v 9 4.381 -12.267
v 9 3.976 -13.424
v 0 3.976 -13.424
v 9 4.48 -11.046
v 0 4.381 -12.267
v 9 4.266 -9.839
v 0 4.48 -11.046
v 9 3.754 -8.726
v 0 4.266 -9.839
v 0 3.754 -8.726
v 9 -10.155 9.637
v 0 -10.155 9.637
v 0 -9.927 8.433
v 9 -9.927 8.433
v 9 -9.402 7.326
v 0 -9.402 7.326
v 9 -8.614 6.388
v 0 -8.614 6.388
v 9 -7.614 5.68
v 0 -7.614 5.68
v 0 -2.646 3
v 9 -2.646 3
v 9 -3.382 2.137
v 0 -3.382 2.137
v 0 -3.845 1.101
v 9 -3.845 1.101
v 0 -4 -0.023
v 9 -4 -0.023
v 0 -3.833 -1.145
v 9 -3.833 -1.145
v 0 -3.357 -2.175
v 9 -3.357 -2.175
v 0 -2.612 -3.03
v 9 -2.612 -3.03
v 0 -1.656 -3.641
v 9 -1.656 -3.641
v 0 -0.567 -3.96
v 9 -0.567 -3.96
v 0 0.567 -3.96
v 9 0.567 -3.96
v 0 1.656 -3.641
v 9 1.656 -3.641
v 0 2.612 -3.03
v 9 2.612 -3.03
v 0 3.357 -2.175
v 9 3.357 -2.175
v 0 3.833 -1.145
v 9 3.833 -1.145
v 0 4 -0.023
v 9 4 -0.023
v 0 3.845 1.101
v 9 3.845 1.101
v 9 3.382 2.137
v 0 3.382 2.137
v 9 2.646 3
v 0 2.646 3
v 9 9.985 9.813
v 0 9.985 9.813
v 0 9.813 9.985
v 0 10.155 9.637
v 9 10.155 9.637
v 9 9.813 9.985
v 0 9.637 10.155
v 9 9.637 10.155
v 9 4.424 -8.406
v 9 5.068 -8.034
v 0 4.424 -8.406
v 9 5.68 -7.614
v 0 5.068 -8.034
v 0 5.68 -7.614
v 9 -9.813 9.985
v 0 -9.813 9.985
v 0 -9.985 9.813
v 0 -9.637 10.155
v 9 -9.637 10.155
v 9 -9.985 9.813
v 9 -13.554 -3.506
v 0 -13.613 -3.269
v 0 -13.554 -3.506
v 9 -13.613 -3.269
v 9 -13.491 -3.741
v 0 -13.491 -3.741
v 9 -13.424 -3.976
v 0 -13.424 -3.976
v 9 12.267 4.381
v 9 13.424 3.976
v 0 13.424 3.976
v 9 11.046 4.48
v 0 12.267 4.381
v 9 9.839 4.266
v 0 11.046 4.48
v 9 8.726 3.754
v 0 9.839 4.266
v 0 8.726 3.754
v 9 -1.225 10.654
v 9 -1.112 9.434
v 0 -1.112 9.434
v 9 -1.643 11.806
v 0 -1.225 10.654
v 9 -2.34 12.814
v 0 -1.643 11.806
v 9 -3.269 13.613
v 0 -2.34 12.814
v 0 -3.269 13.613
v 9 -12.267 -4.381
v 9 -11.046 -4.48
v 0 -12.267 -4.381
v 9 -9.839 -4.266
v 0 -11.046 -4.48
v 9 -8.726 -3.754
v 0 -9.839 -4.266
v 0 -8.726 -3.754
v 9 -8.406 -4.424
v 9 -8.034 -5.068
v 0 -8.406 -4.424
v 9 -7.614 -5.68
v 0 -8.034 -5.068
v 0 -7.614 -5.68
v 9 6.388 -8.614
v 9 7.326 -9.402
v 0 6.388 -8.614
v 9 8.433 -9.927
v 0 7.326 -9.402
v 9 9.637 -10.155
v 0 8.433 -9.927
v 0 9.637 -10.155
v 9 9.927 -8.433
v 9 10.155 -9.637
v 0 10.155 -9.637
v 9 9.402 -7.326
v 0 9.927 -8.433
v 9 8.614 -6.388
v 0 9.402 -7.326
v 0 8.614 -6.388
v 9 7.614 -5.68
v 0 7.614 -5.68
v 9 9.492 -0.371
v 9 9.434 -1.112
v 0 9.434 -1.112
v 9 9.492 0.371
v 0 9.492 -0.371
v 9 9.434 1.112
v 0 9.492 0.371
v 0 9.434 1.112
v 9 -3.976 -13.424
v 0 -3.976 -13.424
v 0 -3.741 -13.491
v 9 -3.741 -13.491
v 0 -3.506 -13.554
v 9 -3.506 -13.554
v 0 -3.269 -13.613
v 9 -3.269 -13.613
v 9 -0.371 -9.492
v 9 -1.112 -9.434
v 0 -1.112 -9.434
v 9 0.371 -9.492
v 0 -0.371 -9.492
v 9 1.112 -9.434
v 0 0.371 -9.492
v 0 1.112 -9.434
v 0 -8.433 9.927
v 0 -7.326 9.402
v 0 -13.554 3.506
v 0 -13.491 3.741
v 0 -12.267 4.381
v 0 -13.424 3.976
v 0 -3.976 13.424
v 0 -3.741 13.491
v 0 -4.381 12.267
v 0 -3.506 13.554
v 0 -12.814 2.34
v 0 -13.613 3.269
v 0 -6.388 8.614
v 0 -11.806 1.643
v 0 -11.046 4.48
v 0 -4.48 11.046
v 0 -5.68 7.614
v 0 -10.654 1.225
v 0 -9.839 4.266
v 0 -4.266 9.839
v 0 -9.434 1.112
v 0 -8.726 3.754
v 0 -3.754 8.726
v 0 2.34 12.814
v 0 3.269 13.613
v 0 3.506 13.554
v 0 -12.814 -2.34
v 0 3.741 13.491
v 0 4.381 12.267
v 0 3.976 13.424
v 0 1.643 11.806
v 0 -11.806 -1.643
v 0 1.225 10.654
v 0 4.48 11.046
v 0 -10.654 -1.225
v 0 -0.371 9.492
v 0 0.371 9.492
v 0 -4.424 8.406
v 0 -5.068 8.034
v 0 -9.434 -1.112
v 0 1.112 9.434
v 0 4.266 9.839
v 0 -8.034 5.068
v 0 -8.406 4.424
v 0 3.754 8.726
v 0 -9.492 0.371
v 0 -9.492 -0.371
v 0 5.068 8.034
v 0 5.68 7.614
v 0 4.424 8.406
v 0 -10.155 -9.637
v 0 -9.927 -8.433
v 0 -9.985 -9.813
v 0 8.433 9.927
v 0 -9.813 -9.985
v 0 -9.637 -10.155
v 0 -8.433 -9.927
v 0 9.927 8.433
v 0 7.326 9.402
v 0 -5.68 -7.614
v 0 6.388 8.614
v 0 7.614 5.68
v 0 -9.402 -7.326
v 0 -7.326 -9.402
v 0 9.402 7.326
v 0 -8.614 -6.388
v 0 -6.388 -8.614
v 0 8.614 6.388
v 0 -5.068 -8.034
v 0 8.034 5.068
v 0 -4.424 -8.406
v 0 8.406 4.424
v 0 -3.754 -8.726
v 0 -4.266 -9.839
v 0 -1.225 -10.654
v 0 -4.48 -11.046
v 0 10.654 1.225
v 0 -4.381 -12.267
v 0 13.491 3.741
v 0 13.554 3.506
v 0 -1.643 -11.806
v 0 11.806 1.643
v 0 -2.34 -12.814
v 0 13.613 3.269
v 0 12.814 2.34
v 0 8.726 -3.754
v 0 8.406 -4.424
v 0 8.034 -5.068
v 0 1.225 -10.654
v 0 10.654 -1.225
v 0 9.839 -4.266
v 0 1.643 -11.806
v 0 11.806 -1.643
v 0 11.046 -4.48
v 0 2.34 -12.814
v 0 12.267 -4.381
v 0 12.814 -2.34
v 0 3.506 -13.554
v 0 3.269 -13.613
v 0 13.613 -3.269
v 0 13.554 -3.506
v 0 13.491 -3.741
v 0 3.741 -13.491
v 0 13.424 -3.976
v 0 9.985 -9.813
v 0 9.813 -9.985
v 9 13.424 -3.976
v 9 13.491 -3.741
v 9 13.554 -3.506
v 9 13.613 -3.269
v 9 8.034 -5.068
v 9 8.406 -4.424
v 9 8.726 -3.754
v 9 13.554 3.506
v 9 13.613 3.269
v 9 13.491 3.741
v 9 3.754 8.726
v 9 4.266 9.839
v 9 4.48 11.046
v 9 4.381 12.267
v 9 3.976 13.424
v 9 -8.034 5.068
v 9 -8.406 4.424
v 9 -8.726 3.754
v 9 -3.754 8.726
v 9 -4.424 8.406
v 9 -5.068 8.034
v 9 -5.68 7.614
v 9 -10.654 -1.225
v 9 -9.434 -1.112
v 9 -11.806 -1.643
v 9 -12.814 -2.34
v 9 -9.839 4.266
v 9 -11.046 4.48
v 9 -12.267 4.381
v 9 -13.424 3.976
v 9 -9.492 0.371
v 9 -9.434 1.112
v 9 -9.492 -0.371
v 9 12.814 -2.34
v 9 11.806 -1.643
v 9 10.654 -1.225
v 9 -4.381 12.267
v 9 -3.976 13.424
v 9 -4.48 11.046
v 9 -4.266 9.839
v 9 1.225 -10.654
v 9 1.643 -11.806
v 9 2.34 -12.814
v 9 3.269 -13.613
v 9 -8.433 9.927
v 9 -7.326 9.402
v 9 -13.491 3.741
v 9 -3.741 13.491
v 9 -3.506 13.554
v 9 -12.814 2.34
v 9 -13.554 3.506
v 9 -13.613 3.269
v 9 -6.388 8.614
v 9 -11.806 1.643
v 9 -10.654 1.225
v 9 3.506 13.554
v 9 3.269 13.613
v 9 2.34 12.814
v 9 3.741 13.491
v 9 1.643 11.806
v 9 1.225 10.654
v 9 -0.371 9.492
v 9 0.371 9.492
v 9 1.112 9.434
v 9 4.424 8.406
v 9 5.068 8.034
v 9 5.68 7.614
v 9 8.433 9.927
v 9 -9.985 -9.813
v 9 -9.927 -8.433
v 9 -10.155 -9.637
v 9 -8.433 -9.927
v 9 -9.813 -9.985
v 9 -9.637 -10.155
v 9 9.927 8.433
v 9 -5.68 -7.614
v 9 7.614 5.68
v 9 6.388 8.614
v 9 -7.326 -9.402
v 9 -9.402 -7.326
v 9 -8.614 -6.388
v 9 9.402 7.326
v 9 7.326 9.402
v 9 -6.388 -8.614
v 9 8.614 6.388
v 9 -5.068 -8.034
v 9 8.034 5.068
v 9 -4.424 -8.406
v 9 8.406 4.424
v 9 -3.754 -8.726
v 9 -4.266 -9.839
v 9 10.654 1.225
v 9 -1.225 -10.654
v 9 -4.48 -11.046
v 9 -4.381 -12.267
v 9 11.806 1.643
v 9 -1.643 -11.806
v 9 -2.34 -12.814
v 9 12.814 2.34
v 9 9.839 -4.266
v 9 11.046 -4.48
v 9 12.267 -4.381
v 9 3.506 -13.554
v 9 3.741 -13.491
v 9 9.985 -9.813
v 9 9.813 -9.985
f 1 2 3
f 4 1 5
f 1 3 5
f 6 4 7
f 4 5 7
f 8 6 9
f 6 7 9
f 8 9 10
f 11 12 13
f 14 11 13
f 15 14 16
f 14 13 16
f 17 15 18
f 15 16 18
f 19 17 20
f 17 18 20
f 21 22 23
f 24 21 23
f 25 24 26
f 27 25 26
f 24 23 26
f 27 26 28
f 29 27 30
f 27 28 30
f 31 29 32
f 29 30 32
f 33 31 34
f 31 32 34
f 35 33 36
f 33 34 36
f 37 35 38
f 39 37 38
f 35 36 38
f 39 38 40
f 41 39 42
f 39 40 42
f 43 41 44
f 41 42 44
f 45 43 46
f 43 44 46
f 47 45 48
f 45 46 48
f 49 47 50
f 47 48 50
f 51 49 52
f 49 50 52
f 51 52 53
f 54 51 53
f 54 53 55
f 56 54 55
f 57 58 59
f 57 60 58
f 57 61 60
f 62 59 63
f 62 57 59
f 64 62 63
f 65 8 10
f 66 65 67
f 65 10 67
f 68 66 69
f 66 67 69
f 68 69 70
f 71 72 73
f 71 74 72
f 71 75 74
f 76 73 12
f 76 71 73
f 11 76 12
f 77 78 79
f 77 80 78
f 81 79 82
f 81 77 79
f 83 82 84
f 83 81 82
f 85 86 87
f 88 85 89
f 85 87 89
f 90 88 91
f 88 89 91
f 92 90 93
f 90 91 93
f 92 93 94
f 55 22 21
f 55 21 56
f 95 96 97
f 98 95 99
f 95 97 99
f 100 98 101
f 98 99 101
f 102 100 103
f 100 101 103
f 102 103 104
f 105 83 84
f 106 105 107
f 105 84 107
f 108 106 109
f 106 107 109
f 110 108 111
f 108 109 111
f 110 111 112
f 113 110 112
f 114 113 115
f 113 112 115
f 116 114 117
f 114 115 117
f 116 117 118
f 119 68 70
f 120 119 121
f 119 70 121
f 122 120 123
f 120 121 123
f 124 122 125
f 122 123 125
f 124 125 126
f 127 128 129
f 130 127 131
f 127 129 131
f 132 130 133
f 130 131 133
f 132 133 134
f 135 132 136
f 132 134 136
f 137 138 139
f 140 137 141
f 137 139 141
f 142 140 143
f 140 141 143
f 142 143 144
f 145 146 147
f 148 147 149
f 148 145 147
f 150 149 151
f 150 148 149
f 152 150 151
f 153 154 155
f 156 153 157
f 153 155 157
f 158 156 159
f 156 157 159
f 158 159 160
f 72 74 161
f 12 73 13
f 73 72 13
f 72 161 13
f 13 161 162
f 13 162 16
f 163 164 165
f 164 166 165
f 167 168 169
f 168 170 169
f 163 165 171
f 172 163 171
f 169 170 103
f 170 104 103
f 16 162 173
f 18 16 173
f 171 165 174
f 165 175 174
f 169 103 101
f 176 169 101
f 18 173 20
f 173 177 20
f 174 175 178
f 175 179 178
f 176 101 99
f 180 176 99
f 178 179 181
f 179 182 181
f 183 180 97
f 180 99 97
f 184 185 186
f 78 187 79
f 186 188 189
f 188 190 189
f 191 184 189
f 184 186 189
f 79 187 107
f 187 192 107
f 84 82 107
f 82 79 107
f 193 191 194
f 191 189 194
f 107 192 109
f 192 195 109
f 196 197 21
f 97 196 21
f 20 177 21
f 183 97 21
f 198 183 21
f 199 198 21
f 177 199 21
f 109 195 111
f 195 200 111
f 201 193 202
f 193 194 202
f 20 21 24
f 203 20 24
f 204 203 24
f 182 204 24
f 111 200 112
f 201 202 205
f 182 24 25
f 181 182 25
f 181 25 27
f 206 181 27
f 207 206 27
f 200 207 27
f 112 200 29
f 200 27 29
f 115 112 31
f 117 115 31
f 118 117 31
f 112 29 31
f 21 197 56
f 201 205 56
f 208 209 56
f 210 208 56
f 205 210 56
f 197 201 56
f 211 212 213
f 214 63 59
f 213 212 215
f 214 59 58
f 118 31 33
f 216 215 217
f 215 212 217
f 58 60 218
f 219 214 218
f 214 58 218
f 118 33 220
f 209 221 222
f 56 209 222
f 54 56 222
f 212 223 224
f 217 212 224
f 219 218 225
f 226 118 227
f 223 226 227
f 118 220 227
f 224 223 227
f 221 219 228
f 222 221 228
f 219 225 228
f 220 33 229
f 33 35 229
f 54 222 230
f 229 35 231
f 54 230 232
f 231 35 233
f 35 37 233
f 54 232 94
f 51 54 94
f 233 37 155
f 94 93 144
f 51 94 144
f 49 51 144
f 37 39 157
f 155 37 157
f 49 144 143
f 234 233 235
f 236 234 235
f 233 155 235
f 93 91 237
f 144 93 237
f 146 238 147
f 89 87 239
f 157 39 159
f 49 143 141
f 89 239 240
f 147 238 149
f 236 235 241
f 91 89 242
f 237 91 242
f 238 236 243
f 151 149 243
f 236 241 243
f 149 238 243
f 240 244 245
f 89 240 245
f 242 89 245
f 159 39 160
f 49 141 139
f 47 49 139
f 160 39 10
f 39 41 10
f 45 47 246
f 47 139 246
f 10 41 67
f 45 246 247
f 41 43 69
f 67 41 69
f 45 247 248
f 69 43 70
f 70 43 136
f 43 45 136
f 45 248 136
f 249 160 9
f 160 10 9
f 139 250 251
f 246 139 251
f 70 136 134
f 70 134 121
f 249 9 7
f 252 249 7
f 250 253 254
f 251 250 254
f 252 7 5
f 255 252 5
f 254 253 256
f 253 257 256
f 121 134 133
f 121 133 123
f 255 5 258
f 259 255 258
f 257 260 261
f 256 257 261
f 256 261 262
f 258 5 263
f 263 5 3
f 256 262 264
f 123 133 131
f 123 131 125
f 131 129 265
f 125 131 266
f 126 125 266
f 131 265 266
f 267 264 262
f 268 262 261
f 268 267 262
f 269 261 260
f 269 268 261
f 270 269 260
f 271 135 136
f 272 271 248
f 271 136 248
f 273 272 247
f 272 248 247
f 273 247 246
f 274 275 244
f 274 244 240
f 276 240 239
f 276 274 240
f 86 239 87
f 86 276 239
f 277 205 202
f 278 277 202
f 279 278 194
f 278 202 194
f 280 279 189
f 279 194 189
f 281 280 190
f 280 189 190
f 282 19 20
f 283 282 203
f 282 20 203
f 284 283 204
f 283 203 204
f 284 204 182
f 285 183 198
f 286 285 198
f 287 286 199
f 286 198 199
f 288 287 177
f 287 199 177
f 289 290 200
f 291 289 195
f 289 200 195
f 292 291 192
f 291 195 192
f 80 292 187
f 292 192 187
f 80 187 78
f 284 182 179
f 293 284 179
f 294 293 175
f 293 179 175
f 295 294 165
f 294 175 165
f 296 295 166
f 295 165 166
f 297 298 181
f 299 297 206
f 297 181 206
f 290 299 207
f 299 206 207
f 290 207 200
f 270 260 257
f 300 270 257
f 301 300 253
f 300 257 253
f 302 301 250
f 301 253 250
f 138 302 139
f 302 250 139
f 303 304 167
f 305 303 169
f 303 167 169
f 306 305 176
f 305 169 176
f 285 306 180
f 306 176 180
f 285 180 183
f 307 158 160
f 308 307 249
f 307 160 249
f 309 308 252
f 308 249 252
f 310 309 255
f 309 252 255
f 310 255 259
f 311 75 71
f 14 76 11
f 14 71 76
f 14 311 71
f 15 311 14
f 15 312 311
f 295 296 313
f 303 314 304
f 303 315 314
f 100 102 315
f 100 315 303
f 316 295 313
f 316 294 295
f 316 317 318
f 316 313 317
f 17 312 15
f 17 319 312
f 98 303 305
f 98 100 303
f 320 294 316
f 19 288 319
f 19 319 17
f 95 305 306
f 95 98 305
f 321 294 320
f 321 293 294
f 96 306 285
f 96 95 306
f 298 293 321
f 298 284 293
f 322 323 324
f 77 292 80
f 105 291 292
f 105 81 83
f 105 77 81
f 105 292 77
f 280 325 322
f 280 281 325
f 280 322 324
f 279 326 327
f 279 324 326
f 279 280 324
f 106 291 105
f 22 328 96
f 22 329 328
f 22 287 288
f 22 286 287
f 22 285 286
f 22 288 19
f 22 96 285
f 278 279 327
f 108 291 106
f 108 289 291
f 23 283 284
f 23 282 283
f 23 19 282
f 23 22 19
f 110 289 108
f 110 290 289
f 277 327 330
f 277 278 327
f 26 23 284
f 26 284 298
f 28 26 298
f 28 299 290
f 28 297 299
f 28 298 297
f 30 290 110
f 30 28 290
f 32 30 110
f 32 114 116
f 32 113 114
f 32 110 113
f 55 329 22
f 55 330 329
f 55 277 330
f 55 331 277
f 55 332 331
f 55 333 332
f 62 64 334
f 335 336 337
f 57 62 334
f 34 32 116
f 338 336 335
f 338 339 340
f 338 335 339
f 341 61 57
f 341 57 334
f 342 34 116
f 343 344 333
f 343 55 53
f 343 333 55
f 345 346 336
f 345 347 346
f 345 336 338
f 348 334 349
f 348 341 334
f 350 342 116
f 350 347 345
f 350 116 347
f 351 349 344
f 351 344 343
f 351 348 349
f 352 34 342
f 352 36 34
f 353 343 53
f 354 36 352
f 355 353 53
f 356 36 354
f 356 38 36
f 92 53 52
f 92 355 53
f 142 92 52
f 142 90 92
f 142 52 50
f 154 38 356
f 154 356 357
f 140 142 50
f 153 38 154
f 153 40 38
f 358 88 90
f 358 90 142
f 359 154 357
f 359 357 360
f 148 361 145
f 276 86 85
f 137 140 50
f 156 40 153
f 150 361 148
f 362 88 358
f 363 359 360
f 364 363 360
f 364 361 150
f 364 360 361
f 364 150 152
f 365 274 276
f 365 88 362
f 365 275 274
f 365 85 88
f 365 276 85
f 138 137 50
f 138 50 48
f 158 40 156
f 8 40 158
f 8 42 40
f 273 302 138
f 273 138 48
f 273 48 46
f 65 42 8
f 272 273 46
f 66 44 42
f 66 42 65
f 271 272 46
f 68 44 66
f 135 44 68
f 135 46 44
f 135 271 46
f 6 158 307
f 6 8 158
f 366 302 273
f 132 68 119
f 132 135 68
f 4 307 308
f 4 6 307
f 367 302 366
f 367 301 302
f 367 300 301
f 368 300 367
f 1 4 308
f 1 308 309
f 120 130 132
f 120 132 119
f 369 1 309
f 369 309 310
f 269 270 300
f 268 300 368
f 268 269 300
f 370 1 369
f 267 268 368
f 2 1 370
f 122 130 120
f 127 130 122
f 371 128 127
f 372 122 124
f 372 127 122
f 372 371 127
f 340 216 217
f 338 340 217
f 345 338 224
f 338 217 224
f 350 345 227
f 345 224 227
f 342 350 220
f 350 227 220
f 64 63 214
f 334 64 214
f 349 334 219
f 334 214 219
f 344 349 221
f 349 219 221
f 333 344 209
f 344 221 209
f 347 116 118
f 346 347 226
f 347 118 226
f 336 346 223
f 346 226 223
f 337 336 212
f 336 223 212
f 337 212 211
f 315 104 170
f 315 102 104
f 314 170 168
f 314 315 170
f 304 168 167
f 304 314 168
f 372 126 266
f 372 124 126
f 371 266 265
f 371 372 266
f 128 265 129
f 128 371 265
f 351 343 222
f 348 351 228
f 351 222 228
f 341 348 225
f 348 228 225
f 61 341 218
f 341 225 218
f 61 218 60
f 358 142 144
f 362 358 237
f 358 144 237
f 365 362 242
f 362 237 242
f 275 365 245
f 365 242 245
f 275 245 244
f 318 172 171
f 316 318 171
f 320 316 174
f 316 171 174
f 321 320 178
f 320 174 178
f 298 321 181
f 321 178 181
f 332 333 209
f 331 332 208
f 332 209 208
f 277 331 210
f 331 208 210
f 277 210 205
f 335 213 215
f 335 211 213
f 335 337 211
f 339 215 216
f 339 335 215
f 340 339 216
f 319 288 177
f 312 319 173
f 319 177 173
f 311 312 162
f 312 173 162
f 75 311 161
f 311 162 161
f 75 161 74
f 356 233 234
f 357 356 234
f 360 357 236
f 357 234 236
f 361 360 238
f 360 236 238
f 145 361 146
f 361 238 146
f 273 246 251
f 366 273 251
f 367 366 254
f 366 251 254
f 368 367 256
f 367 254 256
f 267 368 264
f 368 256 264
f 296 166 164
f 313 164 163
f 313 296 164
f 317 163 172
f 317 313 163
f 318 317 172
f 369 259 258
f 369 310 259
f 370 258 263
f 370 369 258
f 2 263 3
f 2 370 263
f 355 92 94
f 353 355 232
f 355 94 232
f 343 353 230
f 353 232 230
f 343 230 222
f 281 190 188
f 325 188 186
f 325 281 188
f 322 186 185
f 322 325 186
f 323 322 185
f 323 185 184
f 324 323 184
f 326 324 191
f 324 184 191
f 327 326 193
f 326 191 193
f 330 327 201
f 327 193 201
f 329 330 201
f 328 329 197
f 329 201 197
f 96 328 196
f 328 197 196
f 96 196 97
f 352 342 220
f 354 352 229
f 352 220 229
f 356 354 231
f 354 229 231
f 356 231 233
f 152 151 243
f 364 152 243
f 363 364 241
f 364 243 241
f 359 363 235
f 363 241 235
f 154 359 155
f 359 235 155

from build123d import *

# Parameters (mm, degrees)
BASPROSKE_W                 = 9
BASPROSKE_H                 = 14
TOOTHCUT_DEPTH              = 22.748563171
TEETHCUTS_COUNT             = 12
TEETHCUTS_ANGLE             = 330
BORSKE_R                    = 4
BORE_DEPTH                  = 50.0000508
DODANIE_WYCI_GNI_CIE1_START = 9
DODANIE_WYCI_GNI_CIE1_DEPTH = 9


with BuildPart() as part:
    # BasProSke → Base-Revolve (revolve)
    with BuildSketch(Plane(origin=(0, 0, 0), x_dir=(1, 0, 0), z_dir=(0, 1, 0)), mode=Mode.PRIVATE) as base_revolve_sk:
        with Locations((4.5, 7)):
            Rectangle(BASPROSKE_W, BASPROSKE_H)
    revolve(base_revolve_sk.sketch.rotate(Axis((-10, 0, 0), (1, 0, 0)), 180), axis=Axis((-10, 0, 0), (1, 0, 0)))

    # TooCutSke → ToothCut (cut, through all)
    with BuildSketch(Plane(origin=(0, 0, 0), x_dir=(0, 0, -1), z_dir=(1, 0, 0))):
        with BuildLine():
            ThreePointArc((1.111908866, 9.433698091), (0, 9.499), (-1.111908866, 9.433698091))
            ThreePointArc((-1.111908866, 9.433698091), (-1.651516138, 11.821129337), (-3.298149691, 13.632096456))
            ThreePointArc((-3.298149691, 13.632096456), (0, 14.0254), (3.298149691, 13.632096456))
            ThreePointArc((3.298149691, 13.632096456), (1.651516138, 11.821129337), (1.111908866, 9.433698091))
        make_face()
    toothcut = extrude(amount=TOOTHCUT_DEPTH, mode=Mode.SUBTRACT)

    # TeethCuts: ToothCut ×12 about axis
    teethcuts_axis = Axis((-10, 0, 0), (1, 0, 0))
    for i in range(1, TEETHCUTS_COUNT):
        add(toothcut.rotate(teethcuts_axis, i * TEETHCUTS_ANGLE / (TEETHCUTS_COUNT - 1)), mode=Mode.SUBTRACT)

    # BorSke → Bore (cut, symmetric)
    with BuildSketch(Plane(origin=(0, 0, 0), x_dir=(0, 0, -1), z_dir=(1, 0, 0))):
        with Locations(Location((0, 0, 0), (0, 0, 180))):
            Circle(BORSKE_R)
    extrude(amount=BORE_DEPTH, both=True, mode=Mode.SUBTRACT)

    # Szkic1 → Dodanie-wyciągnięcie1 (add)
    with BuildSketch(Plane(origin=(0, 0, 0), x_dir=(0, 0, -1), z_dir=(1, 0, 0)).offset(DODANIE_WYCI_GNI_CIE1_START)):
        with BuildLine():
            ThreePointArc((-3, 2.645751311), (-4, 0), (-3, -2.645751311))
            Line((-3, -2.645751311), (-3, 2.645751311))
        make_face()
    extrude(amount=-DODANIE_WYCI_GNI_CIE1_DEPTH)


solid = part.part
